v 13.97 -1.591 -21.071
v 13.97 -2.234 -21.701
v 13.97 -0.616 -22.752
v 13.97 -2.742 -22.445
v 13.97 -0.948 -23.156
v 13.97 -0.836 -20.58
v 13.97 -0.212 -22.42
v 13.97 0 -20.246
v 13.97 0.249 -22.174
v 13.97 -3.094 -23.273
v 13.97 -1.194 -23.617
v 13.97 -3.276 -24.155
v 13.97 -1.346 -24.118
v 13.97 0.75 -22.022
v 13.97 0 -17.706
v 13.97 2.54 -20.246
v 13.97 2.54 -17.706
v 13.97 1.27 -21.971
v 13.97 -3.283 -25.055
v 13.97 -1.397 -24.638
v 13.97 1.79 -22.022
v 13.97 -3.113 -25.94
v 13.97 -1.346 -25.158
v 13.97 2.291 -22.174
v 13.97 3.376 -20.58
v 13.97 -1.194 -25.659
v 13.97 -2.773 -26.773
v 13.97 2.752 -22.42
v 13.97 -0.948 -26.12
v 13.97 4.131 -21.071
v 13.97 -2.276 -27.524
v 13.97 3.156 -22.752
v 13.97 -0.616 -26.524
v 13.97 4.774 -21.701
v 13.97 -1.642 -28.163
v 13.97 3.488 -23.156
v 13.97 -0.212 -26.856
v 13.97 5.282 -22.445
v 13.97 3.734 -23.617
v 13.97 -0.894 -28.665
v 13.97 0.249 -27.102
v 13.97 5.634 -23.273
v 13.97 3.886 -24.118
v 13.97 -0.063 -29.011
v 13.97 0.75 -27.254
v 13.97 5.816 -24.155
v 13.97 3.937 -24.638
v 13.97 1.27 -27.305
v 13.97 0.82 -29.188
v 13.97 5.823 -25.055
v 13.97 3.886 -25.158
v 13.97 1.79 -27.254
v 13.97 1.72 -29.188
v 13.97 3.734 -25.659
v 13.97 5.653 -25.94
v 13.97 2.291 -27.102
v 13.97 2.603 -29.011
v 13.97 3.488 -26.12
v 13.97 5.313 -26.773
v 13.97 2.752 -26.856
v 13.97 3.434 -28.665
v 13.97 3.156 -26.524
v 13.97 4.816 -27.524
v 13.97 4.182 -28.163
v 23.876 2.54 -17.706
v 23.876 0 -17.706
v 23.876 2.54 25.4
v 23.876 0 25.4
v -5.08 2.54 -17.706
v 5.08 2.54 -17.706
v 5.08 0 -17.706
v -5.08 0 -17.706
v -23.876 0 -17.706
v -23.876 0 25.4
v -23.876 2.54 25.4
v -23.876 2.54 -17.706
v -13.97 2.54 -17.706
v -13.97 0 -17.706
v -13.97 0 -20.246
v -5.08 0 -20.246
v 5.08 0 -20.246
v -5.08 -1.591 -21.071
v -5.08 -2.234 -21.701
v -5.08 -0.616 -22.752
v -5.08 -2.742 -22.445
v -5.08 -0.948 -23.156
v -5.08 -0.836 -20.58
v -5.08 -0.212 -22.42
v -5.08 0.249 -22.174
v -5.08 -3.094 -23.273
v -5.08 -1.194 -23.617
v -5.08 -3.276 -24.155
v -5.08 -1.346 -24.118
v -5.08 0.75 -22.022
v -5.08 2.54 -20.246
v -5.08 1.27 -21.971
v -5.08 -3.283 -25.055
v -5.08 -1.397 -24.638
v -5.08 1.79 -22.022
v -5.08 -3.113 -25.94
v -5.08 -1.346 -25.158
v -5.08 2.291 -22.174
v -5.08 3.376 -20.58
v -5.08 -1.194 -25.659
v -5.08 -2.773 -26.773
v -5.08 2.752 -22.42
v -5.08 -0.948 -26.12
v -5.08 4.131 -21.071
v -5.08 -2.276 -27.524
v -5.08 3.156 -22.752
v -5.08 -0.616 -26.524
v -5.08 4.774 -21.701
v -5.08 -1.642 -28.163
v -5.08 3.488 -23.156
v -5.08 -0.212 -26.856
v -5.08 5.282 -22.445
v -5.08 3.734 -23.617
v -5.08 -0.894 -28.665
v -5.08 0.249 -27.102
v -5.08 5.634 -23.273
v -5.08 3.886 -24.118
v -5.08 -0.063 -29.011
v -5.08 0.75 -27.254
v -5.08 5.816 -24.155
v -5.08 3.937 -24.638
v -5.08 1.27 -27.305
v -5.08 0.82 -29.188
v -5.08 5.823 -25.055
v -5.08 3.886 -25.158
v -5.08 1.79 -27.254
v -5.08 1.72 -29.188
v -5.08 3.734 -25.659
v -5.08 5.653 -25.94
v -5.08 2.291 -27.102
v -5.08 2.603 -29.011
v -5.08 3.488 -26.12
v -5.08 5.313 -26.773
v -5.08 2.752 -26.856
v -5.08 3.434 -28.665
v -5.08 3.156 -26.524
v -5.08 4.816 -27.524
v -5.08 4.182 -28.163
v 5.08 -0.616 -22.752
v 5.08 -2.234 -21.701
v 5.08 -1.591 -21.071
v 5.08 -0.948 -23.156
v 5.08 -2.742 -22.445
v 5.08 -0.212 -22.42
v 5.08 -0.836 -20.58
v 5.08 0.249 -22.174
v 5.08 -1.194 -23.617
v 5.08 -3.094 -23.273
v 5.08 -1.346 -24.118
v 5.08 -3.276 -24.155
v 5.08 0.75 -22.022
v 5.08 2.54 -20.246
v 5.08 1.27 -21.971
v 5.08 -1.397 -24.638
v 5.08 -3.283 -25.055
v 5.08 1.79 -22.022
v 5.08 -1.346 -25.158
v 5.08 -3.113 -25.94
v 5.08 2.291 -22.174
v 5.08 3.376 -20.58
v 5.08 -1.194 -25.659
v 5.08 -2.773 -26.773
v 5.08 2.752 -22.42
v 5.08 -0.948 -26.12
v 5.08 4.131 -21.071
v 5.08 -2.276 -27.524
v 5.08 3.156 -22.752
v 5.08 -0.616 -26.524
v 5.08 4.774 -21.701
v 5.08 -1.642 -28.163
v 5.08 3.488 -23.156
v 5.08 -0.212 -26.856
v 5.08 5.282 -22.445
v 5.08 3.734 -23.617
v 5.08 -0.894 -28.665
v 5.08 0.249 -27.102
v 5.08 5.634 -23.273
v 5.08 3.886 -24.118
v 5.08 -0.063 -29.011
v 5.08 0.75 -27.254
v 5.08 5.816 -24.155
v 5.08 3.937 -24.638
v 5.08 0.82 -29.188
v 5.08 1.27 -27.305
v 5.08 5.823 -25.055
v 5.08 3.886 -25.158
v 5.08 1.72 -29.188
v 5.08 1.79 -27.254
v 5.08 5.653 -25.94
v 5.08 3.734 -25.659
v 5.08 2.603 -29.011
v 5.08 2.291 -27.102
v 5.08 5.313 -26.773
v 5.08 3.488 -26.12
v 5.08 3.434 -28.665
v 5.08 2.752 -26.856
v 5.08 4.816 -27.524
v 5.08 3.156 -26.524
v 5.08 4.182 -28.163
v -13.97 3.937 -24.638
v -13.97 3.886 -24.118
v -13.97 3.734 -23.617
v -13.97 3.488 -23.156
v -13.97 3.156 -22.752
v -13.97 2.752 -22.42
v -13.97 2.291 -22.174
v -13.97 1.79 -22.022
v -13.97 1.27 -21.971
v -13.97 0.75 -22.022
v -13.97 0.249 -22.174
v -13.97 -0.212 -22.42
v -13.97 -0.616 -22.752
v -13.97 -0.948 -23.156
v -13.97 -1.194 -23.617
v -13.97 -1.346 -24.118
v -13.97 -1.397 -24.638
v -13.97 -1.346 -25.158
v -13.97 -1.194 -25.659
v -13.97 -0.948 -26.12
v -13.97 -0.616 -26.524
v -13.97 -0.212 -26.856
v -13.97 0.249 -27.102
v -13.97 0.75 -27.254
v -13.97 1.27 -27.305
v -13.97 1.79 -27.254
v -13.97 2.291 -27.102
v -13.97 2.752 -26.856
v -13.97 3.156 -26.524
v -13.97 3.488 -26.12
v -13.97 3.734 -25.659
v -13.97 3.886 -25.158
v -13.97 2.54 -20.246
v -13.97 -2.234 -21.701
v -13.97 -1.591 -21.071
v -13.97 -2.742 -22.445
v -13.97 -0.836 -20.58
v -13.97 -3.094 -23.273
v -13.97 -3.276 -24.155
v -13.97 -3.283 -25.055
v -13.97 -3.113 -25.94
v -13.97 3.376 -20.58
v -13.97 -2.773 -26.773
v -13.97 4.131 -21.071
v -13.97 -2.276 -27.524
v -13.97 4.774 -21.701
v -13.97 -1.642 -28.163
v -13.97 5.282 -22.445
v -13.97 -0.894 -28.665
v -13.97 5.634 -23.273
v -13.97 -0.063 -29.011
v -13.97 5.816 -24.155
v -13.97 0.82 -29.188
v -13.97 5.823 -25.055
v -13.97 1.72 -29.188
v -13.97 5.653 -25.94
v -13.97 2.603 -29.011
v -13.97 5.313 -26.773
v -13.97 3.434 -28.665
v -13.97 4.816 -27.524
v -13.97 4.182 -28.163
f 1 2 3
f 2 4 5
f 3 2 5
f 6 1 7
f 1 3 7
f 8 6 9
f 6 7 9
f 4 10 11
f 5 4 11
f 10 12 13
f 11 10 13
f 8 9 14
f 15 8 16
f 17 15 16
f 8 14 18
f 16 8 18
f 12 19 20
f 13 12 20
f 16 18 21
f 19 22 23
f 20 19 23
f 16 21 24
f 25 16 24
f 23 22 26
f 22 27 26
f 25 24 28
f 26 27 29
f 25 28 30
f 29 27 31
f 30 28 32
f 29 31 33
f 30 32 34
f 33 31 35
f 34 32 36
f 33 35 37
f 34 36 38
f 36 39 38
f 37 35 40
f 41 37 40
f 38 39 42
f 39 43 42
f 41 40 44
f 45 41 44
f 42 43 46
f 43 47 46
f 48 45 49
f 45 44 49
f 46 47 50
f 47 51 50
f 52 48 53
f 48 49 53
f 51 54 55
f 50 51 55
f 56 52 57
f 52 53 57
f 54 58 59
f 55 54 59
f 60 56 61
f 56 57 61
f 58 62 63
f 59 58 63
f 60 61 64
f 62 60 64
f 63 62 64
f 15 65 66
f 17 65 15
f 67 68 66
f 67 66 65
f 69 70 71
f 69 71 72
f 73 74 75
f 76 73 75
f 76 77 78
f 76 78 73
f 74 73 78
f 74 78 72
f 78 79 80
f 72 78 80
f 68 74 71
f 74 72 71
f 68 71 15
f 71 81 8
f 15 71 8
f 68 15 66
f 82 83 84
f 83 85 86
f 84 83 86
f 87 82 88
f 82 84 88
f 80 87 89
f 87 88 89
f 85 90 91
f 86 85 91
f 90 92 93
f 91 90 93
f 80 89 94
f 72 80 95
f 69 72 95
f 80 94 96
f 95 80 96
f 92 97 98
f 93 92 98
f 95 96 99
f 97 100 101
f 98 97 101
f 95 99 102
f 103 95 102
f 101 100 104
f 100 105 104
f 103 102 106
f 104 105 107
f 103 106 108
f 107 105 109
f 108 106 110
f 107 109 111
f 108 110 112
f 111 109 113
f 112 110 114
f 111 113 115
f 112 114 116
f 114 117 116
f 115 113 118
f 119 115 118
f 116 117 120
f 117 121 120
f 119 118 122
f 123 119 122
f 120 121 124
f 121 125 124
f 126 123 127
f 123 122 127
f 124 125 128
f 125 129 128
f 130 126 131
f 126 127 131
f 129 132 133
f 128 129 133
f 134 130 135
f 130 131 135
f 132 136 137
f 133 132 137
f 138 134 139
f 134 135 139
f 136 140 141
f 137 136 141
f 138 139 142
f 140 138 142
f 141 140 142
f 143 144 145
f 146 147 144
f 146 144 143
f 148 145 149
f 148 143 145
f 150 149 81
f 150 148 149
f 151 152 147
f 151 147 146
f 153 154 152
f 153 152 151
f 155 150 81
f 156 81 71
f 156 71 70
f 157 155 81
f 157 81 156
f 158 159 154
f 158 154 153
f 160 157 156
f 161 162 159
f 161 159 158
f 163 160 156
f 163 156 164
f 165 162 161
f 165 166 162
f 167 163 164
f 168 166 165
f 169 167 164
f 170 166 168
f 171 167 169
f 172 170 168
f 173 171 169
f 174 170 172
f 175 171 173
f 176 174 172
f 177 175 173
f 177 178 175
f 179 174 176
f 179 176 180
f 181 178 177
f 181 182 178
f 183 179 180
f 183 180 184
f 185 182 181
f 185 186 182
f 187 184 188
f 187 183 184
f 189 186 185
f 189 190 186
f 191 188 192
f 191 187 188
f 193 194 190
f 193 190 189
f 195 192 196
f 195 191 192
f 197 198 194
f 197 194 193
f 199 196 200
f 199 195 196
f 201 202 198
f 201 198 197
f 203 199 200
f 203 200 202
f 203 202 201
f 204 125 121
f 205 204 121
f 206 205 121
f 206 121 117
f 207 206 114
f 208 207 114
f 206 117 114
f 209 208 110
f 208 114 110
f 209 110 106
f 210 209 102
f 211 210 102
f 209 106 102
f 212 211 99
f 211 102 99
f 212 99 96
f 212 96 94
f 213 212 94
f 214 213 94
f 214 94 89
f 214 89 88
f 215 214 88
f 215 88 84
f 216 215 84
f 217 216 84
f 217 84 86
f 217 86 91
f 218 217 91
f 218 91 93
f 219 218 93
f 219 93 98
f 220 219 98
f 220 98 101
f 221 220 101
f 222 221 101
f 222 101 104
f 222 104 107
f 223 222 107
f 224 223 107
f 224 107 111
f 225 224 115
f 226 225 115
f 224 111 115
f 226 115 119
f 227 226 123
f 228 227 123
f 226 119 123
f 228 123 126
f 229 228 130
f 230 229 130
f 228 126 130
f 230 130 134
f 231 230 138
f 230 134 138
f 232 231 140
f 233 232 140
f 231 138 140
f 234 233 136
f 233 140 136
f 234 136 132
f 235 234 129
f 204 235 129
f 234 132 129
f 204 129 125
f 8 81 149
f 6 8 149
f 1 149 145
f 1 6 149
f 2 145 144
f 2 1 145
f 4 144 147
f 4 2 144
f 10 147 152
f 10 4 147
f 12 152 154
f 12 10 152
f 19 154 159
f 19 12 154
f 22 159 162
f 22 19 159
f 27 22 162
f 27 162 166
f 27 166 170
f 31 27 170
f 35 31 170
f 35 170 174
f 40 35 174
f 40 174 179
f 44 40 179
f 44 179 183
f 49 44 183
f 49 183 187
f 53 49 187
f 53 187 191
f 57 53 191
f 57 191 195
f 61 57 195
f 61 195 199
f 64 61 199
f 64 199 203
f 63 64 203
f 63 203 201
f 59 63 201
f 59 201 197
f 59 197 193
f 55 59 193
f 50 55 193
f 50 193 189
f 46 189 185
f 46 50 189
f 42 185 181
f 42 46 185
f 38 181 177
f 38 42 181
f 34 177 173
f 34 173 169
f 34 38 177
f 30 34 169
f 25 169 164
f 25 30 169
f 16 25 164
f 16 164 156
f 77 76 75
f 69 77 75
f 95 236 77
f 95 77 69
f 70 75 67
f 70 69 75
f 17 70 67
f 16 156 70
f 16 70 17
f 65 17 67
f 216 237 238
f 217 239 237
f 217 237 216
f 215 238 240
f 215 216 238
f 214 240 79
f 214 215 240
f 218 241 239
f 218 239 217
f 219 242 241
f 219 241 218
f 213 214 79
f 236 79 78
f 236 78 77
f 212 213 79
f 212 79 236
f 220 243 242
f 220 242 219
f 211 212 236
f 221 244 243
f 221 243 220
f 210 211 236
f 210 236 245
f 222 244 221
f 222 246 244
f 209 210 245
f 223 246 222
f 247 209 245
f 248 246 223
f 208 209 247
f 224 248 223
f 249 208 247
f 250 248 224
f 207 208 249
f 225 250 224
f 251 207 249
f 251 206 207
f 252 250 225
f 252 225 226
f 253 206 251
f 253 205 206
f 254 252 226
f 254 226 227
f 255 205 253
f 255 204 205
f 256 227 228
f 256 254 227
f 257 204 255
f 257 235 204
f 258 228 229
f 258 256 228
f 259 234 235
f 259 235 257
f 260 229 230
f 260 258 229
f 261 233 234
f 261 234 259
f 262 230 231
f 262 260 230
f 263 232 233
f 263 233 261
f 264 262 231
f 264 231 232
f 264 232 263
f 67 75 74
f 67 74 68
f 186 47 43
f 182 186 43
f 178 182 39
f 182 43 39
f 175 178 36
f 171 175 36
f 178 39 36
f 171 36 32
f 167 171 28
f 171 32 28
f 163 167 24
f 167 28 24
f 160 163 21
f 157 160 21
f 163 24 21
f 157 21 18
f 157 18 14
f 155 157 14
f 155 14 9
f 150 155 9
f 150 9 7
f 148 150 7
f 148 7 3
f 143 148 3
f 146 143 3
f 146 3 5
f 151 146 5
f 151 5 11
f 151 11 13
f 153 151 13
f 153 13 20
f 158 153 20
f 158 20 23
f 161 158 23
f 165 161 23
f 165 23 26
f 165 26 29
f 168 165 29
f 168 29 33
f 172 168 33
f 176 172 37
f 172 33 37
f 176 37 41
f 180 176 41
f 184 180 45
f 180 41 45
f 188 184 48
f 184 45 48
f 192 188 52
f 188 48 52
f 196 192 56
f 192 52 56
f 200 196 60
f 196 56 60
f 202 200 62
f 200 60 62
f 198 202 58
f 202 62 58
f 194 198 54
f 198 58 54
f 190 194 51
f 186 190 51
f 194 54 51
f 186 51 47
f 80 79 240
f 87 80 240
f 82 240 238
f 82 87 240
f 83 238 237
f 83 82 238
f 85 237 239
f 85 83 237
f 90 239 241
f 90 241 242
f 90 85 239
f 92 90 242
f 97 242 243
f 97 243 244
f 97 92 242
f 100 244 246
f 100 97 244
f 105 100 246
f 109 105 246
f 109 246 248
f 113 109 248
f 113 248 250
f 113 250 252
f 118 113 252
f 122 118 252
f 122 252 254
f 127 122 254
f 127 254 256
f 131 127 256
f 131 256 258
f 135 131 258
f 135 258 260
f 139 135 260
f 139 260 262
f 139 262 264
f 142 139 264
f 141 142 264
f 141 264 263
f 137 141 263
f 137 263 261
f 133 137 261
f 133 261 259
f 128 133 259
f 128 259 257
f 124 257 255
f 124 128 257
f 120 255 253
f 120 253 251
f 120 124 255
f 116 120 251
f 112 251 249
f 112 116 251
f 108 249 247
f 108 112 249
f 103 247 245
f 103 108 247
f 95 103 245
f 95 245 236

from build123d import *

# Parameters (mm, degrees)
SKETCH1_W               = 47.752
SKETCH1_H               = 40.64
BOSS_EXTRUDE1_DEPTH     = 2.54
SKETCH3_R               = 4.572
BOSS_EXTRUDE3_DEPTH     = 23.876
SKETCH7_W               = 10.16
SKETCH7_H               = 13.274102891
SKETCH7_W_2             = 10.953832873
SKETCH7_H_2             = 12.896384516
SKETCH7_W_3             = 11.331551248
CUT_EXTRUDE4_DEPTH      = 47.752
CUT_EXTRUDE4_DEPTH_BACK = 2.54
SKETCH8_W               = 47.752
SKETCH8_H               = 2.54
BOSS_EXTRUDE4_DEPTH     = 5.08
SKETCH9_R               = 2.667
CUT_EXTRUDE5_DEPTH      = 33.782


with BuildPart() as part:
    # Sketch1 → Boss-Extrude1 (new body)
    with BuildSketch(Plane(origin=(0, 0, 0), x_dir=(1, 0, 0), z_dir=(0, 1, 0))):
        Rectangle(SKETCH1_W, SKETCH1_H)
    extrude(amount=BOSS_EXTRUDE1_DEPTH)

    # Sketch3 → Boss-Extrude3 (add, symmetric)
    with BuildSketch(Plane(origin=(0, 0, 0), x_dir=(0, 0, -1), z_dir=(1, 0, 0))):
        with Locations((24.638, 1.27)):
            Circle(SKETCH3_R)
    extrude(amount=BOSS_EXTRUDE3_DEPTH, both=True)

    # Sketch7 → Cut-Extrude4 (cut, two sides)
    with BuildSketch(Plane(origin=(0, 0, -20.245929418), x_dir=(-1, 0, 0), z_dir=(0, 0, -1))) as cut_extrude4_sk:
        with Locations((0, 0.687607575)):
            Rectangle(SKETCH7_W, SKETCH7_H)
        with Locations((19.446916437, 0.498748388)):
            Rectangle(SKETCH7_W_2, SKETCH7_H_2)
        with Locations((-19.635775624, 0.687607575)):
            Rectangle(SKETCH7_W_3, SKETCH7_H)
    extrude(amount=CUT_EXTRUDE4_DEPTH, mode=Mode.SUBTRACT)
    extrude(cut_extrude4_sk.sketch, amount=-CUT_EXTRUDE4_DEPTH_BACK, mode=Mode.SUBTRACT)

    # Sketch8 → Boss-Extrude4 (add)
    with BuildSketch(Plane.XY.offset(20.32)):
        with Locations((0, 1.27)):
            Rectangle(SKETCH8_W, SKETCH8_H)
    extrude(amount=BOSS_EXTRUDE4_DEPTH)

    # Sketch9 → Cut-Extrude5 (cut)
    with BuildSketch(Plane(origin=(13.97, 0, 0), x_dir=(0, 0, -1), z_dir=(1, 0, 0))):
        with Locations(Location((24.638, 1.27, 0), (0, 0, 90))):  # turned: the seam where the file's is
            Circle(SKETCH9_R)
    extrude(amount=-CUT_EXTRUDE5_DEPTH, mode=Mode.SUBTRACT)


solid = part.part
